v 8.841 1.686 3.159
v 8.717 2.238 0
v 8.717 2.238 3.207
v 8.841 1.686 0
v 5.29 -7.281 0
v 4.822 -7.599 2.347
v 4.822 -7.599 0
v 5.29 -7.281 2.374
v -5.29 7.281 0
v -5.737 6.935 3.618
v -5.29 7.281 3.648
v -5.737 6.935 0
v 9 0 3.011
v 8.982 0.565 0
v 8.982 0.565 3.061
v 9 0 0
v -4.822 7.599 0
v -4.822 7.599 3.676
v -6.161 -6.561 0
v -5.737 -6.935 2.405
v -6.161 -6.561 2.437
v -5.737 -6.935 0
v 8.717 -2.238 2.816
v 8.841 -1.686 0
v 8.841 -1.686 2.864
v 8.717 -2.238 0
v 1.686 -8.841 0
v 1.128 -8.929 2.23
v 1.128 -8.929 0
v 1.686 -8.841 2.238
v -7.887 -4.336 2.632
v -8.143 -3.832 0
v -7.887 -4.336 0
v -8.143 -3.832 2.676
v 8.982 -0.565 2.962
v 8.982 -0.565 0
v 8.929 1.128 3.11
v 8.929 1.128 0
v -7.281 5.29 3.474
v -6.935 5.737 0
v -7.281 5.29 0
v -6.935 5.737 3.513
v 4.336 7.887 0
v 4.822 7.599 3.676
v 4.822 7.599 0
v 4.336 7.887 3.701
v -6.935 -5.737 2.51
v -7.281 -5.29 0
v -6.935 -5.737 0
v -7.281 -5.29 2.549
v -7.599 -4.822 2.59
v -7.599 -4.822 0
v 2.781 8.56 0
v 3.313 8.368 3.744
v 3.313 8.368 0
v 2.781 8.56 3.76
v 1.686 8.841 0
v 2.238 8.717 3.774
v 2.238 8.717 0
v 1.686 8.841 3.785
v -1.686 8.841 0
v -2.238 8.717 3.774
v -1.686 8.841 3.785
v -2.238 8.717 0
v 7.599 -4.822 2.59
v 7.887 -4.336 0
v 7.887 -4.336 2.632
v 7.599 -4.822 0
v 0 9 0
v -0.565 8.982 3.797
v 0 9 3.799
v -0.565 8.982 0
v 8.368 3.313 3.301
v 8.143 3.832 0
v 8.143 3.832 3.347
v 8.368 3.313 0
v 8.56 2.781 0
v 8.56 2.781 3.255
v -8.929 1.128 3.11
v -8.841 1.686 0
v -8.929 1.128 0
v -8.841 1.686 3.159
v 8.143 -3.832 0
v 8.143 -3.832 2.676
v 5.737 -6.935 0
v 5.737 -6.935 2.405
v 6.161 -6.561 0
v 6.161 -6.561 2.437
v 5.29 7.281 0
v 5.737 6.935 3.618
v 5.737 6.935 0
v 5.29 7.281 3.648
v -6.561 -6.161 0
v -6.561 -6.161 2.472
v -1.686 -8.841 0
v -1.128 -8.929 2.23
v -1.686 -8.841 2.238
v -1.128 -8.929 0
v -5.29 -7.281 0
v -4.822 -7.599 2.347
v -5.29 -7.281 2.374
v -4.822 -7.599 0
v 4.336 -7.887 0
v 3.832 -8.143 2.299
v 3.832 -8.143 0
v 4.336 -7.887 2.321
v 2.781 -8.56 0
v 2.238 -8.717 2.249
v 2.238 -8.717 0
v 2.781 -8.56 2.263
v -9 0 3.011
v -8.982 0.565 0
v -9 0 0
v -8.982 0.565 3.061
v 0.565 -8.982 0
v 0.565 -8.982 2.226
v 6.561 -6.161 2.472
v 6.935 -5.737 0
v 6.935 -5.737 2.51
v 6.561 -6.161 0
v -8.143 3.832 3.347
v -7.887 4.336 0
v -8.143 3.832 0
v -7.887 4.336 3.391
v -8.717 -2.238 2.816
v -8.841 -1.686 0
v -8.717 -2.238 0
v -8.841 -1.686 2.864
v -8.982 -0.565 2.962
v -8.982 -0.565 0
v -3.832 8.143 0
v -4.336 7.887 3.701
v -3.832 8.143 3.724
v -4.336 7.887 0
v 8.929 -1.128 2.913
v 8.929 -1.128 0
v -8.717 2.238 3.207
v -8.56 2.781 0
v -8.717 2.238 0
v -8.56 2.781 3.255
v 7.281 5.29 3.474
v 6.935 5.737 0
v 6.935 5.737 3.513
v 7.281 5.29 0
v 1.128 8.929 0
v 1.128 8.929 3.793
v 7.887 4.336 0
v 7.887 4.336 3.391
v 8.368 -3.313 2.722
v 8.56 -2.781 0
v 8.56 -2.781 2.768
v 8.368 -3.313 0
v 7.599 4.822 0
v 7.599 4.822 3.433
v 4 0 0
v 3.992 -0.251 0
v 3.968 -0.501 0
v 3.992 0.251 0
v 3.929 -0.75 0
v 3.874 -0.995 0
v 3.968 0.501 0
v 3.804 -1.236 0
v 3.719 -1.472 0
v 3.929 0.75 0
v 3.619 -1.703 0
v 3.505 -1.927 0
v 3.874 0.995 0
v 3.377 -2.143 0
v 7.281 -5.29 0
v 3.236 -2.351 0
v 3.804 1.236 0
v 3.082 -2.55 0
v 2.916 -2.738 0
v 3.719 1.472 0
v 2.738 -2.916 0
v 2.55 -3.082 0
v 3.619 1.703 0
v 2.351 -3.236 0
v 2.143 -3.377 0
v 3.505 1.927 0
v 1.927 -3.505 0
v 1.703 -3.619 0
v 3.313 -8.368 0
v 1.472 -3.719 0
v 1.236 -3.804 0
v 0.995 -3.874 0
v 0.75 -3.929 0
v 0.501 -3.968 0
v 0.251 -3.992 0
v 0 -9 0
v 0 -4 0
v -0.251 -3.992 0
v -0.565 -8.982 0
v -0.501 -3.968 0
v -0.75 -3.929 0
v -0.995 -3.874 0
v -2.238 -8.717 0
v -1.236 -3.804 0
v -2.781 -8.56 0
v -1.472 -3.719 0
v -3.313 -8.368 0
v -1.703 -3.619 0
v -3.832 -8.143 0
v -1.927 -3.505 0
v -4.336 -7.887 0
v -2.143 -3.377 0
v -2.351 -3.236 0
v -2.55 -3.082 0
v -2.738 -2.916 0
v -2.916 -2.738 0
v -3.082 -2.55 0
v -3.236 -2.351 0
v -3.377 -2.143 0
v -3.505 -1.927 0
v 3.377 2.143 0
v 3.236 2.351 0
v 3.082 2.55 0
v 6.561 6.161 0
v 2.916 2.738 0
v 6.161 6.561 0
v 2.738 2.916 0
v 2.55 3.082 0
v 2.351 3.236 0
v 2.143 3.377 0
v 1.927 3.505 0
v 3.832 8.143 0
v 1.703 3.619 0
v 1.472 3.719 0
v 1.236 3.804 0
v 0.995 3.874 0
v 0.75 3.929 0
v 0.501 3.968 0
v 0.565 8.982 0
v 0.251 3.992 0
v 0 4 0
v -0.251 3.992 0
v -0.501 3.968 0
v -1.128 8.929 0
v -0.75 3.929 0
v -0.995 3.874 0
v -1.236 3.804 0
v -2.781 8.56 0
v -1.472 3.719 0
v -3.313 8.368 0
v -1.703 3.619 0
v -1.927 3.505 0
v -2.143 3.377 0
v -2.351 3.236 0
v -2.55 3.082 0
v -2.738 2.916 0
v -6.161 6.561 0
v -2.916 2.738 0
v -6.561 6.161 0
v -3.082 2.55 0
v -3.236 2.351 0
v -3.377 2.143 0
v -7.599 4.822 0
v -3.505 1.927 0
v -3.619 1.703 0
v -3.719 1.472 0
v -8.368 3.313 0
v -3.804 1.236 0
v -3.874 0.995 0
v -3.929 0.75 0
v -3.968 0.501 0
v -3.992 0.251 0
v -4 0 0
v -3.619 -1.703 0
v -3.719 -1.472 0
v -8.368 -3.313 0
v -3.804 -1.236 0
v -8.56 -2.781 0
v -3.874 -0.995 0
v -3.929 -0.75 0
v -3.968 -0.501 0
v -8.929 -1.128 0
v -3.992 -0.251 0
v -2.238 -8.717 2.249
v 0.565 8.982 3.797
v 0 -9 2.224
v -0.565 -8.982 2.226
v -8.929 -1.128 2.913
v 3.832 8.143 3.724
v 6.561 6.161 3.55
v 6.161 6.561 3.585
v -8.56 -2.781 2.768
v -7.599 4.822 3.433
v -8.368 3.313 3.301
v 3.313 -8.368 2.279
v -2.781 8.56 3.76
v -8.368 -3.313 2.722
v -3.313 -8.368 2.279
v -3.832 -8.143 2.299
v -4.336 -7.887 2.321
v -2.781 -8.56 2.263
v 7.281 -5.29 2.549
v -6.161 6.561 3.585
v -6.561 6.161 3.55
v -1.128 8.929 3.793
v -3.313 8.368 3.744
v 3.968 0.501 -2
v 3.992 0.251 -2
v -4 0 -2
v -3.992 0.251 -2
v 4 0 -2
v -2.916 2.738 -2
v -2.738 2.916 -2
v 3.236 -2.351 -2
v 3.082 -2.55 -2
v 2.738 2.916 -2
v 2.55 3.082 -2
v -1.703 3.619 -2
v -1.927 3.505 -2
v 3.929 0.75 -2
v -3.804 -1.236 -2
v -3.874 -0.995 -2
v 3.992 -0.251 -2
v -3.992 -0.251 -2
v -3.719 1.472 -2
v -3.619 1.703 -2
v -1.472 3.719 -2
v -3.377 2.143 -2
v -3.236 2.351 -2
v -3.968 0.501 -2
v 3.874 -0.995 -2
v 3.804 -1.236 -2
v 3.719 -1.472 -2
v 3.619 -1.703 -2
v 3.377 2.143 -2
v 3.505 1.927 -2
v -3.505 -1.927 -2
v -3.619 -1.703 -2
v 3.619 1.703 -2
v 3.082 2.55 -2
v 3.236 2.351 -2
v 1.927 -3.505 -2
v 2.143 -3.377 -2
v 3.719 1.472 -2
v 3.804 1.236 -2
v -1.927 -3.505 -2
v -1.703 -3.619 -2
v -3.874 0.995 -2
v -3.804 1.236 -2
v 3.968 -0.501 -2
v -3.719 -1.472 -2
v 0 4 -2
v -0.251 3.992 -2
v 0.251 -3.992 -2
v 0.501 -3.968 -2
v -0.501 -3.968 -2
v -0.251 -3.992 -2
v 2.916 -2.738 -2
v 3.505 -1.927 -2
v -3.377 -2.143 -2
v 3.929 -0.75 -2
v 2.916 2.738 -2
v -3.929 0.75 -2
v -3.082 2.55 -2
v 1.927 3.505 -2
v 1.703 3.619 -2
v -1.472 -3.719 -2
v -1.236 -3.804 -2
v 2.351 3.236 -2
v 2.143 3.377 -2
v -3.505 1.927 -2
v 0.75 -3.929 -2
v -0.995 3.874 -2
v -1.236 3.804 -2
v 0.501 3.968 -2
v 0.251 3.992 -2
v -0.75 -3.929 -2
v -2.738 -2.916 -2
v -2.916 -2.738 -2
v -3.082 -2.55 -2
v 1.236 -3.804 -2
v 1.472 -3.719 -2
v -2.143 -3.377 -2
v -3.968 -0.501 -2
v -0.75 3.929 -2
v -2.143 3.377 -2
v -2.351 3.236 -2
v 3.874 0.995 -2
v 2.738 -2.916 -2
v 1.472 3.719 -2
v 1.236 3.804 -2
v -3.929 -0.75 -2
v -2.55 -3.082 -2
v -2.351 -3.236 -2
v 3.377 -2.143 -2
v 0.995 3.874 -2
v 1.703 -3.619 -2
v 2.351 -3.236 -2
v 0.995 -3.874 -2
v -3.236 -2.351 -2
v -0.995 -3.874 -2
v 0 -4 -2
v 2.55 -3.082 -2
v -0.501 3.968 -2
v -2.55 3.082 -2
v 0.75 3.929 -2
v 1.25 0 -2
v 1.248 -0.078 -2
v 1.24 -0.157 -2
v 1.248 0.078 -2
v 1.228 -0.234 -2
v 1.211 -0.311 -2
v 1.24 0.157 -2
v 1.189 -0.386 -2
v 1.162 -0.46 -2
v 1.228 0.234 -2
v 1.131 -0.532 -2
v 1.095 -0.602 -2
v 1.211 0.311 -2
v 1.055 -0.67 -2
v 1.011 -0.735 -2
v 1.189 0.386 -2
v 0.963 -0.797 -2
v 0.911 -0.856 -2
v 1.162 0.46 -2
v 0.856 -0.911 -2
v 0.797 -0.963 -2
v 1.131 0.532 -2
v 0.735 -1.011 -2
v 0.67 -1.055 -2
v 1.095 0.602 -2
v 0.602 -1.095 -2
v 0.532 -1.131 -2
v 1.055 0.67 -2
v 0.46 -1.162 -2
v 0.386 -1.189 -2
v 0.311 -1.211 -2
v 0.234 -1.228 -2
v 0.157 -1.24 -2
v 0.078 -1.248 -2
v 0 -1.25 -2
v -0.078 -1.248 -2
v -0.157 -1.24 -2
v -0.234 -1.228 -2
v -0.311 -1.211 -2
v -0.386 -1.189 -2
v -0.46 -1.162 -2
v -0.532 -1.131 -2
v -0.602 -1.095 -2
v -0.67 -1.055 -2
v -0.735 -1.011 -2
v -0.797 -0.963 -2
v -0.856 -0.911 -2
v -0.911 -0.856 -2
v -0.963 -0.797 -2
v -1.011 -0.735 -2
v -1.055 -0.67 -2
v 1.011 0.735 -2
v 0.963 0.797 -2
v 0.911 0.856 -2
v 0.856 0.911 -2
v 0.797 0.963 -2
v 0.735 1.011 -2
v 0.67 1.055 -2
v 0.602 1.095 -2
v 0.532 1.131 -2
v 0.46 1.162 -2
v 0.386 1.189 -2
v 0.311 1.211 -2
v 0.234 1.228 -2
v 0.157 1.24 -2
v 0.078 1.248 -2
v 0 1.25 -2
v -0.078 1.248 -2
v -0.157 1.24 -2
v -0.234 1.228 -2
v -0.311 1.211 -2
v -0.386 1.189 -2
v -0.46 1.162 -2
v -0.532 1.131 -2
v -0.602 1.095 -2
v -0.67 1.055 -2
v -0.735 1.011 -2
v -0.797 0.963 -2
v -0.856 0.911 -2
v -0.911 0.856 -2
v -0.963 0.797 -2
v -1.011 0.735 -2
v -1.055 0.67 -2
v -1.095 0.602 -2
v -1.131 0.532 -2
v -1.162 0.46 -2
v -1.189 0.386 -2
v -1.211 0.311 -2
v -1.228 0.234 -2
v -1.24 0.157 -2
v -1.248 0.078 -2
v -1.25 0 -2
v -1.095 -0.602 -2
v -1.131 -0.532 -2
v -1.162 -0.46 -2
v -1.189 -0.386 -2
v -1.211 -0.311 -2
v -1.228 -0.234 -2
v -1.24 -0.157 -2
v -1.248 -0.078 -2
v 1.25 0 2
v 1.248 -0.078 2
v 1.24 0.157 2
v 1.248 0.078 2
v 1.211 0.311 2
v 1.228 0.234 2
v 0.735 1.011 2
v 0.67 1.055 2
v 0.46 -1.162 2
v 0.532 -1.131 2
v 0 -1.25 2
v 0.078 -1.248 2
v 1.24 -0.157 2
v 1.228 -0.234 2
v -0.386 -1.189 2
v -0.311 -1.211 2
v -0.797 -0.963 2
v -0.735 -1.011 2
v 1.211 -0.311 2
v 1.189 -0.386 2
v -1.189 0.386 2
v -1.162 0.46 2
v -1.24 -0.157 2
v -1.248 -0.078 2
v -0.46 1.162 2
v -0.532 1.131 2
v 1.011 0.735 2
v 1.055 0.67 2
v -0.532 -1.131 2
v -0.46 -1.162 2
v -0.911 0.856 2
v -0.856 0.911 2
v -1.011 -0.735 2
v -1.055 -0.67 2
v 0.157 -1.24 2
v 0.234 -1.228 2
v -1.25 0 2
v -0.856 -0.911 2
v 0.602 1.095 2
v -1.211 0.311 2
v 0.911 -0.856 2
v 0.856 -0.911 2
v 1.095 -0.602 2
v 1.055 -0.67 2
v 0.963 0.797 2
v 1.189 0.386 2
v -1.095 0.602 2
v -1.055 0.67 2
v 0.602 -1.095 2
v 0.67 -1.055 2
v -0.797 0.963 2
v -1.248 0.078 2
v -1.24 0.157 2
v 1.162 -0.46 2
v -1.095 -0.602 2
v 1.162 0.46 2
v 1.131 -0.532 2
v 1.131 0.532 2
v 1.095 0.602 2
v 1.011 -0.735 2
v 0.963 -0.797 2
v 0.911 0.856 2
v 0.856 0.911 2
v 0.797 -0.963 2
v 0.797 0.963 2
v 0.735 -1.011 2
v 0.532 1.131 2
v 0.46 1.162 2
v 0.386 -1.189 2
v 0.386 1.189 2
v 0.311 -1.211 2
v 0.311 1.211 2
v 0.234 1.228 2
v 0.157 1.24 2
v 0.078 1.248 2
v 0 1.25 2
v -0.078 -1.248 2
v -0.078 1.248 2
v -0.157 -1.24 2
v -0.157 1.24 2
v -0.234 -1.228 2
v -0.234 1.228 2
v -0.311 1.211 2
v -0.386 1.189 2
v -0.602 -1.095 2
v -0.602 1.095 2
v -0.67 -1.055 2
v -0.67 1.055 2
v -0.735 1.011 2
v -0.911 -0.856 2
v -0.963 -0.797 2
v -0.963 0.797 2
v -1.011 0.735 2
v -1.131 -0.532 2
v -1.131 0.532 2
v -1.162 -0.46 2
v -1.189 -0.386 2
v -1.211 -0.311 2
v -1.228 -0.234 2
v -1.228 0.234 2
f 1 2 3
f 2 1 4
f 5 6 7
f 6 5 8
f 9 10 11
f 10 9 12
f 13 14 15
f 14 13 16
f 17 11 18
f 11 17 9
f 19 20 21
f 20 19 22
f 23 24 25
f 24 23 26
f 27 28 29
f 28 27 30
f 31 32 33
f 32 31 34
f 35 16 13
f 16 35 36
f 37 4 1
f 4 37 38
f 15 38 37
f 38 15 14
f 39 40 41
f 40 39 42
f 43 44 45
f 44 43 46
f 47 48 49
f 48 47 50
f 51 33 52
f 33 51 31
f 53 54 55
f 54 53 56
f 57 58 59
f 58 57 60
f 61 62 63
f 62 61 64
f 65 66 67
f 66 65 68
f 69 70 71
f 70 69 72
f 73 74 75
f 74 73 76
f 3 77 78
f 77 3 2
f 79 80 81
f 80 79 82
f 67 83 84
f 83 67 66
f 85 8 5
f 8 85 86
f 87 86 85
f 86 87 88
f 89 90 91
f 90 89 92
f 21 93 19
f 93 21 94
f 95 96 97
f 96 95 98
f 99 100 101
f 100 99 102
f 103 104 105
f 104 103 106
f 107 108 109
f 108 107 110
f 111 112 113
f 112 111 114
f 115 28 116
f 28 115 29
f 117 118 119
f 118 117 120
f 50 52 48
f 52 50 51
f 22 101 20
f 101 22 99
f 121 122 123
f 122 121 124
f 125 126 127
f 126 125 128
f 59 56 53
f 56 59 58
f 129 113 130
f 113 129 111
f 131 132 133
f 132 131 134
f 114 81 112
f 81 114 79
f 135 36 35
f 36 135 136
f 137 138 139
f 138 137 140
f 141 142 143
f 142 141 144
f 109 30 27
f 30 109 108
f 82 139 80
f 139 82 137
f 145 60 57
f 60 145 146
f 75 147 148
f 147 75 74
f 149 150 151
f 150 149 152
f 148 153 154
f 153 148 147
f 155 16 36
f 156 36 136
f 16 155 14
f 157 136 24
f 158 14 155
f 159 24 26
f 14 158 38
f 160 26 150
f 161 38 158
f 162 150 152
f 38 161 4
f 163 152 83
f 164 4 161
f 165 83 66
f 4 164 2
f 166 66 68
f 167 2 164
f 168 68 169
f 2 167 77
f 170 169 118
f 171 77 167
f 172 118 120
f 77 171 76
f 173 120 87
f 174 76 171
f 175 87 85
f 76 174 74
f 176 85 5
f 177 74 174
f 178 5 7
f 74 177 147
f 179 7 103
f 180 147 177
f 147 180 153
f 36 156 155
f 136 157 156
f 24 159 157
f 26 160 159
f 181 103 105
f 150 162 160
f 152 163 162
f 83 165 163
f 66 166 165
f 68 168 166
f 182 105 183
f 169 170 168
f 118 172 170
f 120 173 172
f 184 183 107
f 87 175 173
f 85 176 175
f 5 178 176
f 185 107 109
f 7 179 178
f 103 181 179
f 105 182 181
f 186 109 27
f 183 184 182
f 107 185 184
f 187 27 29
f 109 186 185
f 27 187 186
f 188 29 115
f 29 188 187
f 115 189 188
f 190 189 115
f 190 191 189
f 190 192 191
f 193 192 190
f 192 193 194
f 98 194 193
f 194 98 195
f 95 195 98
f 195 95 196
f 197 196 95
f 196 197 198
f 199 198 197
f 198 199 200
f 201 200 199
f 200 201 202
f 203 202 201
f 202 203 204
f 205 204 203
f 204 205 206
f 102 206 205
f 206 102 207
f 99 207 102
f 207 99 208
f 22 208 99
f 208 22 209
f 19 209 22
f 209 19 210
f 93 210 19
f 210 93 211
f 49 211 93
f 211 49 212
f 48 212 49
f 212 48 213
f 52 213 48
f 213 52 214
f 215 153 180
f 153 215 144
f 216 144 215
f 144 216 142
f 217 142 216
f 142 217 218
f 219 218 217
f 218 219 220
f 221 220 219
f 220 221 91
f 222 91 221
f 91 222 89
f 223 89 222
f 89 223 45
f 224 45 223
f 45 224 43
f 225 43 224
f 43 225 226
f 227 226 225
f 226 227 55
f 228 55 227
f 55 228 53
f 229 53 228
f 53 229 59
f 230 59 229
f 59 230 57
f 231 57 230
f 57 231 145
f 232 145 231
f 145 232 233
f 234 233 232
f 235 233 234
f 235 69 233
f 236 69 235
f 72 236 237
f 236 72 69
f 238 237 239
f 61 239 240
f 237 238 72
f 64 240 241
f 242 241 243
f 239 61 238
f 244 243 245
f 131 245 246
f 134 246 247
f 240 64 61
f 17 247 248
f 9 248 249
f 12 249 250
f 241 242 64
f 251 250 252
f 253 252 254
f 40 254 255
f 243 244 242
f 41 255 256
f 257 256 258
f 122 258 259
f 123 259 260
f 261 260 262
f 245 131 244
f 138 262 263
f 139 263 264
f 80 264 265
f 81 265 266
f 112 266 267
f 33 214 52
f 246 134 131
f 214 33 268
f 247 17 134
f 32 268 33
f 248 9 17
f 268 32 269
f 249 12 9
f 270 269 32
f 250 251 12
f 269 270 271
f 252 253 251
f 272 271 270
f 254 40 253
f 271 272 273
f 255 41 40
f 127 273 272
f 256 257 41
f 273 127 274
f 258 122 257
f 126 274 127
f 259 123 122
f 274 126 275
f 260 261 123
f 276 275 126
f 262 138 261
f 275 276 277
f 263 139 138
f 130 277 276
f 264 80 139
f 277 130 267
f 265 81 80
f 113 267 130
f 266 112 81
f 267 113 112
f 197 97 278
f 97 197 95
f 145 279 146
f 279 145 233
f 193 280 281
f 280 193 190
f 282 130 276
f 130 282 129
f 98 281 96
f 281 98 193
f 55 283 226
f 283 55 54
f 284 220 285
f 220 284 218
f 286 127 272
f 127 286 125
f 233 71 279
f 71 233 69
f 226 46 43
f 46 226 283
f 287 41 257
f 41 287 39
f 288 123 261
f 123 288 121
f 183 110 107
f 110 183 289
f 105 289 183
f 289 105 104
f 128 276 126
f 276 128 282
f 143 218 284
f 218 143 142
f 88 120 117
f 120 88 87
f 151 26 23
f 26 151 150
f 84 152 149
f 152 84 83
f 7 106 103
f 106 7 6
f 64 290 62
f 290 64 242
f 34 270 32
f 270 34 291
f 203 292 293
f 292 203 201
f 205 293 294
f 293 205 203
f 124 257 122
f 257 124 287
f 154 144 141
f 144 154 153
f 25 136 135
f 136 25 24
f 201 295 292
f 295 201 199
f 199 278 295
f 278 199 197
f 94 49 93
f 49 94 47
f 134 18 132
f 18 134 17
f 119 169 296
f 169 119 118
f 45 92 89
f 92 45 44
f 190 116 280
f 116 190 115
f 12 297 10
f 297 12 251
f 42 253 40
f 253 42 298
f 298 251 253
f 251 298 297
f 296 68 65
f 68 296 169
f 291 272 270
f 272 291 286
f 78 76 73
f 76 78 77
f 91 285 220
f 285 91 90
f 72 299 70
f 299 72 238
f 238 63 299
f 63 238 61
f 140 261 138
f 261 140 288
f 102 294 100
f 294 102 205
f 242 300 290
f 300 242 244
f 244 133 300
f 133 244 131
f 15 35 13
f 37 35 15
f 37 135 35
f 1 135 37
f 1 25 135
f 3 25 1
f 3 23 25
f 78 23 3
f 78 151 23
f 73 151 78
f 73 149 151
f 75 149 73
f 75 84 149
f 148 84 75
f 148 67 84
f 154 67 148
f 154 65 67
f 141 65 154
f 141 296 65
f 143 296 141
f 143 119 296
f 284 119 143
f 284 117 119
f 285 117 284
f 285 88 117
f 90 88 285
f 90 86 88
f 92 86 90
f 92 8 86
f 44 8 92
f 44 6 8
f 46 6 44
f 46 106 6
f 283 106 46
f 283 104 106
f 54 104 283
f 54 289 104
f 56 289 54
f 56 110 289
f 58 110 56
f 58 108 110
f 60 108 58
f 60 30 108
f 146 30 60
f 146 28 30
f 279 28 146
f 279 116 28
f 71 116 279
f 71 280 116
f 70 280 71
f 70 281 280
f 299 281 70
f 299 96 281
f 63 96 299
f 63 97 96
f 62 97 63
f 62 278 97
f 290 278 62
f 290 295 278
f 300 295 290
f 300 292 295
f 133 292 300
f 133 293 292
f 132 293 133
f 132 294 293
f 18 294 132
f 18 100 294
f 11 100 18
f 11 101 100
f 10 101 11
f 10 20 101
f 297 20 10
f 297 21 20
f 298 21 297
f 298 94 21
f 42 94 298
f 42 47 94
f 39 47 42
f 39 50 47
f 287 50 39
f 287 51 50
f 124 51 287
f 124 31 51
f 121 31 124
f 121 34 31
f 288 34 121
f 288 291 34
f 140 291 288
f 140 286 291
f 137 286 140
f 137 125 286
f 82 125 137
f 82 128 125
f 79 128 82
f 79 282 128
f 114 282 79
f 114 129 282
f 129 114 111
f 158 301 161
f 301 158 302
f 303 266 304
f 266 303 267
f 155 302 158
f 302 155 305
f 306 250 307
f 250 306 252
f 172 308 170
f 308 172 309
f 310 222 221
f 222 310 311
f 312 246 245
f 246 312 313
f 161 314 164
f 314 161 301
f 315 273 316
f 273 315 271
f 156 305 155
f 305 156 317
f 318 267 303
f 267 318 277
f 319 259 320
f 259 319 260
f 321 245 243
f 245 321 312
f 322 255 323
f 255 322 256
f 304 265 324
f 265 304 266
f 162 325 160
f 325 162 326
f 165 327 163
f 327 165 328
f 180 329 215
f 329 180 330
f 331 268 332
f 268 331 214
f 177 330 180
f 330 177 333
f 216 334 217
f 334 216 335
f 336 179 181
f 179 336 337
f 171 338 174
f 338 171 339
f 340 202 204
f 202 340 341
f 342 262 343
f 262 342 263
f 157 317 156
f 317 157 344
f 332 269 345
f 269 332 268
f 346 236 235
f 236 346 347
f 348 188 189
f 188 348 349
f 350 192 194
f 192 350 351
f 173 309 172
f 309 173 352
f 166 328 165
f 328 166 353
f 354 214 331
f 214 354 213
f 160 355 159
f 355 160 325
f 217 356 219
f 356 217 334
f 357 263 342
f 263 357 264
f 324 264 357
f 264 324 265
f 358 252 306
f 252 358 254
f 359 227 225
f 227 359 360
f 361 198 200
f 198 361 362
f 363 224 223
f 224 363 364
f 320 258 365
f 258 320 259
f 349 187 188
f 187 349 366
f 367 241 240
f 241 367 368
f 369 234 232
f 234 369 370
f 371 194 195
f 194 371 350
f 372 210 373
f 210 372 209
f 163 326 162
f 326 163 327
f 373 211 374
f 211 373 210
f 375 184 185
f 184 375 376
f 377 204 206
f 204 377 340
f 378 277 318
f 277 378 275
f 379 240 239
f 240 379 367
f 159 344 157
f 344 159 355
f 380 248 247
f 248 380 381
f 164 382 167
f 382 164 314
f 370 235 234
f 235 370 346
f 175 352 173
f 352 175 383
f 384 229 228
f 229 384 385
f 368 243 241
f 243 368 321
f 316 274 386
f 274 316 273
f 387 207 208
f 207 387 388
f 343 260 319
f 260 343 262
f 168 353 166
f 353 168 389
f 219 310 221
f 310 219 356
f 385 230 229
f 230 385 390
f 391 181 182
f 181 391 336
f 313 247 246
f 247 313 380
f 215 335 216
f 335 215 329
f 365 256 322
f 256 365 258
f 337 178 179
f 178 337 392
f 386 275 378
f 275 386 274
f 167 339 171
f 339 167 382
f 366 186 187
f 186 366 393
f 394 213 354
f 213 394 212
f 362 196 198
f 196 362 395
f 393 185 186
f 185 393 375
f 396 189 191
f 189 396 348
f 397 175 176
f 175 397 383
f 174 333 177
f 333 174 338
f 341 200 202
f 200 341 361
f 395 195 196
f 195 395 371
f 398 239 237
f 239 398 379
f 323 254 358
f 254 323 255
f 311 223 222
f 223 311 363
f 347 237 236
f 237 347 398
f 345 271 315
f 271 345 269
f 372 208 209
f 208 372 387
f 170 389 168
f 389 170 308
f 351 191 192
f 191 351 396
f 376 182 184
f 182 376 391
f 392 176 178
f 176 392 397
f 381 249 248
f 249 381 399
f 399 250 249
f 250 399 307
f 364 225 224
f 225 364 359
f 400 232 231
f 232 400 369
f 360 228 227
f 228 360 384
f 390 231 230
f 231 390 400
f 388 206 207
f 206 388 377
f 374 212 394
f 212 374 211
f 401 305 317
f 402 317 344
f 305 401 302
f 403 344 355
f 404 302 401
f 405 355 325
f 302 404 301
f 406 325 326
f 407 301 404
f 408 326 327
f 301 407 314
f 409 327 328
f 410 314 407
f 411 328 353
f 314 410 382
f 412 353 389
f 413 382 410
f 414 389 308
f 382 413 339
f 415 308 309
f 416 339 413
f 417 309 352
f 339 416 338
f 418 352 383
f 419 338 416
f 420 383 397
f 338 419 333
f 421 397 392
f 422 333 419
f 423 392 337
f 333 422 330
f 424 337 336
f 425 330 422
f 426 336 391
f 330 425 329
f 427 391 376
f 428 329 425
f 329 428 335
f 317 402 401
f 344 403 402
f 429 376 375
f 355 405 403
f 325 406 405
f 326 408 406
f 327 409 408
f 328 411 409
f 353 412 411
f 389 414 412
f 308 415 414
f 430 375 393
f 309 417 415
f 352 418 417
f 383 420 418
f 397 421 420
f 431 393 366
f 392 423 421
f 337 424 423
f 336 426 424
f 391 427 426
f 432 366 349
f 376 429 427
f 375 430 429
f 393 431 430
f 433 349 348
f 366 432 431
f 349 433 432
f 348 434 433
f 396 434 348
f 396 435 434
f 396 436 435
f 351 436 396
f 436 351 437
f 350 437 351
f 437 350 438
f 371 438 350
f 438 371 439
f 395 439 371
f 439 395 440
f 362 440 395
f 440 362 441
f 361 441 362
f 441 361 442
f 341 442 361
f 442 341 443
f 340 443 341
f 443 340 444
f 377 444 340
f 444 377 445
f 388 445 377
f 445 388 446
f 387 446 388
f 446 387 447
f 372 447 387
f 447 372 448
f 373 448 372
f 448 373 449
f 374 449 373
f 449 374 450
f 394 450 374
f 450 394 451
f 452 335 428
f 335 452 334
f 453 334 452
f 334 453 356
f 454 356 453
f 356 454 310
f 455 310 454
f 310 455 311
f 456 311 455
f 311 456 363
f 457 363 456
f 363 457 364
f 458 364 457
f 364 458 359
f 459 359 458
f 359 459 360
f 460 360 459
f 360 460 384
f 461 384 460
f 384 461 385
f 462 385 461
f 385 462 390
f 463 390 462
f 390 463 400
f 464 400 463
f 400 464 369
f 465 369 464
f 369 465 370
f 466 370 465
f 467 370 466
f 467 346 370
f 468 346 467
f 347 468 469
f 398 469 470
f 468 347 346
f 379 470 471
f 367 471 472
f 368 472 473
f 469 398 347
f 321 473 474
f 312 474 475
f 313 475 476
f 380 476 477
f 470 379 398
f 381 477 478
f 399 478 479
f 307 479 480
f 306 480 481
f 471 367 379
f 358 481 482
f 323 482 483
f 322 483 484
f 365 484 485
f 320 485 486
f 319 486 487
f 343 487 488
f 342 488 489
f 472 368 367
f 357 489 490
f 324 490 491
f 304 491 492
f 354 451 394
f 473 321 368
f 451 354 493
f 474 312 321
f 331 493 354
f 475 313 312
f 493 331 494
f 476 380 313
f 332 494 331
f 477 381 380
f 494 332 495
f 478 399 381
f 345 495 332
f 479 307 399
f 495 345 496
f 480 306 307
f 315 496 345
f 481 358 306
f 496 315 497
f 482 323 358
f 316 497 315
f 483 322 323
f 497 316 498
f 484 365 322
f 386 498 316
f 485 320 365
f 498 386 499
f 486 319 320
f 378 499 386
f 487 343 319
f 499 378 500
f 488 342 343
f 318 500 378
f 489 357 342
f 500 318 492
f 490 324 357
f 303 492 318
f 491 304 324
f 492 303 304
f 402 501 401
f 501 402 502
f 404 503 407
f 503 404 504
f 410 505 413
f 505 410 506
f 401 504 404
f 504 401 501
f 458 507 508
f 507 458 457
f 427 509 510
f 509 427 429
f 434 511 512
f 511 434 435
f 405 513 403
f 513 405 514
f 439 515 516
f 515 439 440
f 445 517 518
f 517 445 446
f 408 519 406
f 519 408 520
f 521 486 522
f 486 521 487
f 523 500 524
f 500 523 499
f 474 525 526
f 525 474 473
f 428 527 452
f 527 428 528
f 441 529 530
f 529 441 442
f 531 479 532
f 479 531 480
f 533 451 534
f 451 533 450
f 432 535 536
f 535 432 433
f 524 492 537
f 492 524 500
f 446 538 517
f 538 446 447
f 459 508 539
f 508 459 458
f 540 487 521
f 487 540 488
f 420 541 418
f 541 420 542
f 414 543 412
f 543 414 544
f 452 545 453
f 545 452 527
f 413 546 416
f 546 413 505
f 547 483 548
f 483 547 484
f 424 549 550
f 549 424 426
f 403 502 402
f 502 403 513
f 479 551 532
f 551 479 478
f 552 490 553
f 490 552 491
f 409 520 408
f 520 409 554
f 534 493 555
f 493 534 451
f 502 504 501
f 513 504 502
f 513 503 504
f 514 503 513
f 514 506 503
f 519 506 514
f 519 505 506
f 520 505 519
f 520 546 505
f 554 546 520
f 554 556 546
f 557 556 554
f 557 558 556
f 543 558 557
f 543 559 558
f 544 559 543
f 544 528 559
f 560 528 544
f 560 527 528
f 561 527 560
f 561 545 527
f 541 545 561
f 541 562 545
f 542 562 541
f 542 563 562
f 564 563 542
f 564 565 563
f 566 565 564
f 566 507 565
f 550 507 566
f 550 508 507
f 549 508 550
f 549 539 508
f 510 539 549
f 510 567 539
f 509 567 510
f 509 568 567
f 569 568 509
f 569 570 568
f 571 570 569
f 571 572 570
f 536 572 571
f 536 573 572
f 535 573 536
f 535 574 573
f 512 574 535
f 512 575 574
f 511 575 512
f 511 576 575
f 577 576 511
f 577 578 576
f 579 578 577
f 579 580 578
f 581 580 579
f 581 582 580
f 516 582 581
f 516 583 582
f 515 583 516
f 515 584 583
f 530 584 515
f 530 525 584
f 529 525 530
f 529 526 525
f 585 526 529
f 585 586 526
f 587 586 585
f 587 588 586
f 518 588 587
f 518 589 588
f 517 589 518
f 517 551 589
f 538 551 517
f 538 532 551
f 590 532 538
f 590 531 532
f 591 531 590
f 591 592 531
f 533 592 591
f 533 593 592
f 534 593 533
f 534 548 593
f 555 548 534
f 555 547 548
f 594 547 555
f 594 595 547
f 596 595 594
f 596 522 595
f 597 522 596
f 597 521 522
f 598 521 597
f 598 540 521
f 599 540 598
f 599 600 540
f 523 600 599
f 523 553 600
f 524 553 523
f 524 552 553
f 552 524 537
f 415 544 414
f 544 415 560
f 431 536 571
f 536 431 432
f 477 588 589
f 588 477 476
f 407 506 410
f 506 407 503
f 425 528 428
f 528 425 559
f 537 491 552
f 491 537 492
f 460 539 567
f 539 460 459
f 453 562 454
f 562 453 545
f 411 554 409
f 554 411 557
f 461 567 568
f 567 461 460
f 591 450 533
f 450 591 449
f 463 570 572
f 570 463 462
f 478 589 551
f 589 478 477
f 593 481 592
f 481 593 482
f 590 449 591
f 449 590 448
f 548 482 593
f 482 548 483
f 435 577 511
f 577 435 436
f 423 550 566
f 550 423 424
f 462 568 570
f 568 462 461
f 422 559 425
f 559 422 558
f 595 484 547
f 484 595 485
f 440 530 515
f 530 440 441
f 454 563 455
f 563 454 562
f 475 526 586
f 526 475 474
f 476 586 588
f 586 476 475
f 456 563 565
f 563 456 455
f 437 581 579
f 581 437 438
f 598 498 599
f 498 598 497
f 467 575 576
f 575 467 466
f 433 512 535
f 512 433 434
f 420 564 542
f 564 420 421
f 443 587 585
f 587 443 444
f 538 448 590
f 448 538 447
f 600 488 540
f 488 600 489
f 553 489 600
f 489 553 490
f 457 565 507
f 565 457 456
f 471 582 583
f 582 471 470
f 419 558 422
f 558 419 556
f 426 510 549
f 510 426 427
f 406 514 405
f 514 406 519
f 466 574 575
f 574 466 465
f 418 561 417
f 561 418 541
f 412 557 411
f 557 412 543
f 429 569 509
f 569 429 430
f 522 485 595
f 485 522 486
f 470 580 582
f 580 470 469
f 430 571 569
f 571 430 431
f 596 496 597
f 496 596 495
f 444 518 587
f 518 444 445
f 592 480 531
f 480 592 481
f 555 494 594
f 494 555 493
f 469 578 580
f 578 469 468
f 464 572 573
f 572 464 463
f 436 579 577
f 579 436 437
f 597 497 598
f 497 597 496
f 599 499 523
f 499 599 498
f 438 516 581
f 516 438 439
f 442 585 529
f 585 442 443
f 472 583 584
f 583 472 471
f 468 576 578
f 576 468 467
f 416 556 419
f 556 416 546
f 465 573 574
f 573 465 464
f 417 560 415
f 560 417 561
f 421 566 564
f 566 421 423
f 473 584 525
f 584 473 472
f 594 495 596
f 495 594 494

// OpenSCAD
/*

    motor_flange2.scad

    
    Flange for motor used in laser audio project. The top of the cylinder is tilted and that's the surface to stick the mirror onto.
    
    
    Author: Mahesh Venkitachalam (electronut.in)
*/

// set smoothness
$fn=100;

// tilt angle 
a = 5;

// top cylinder module 
module top_cyl(a = 5, r = 9, h = 20, t = 3) {
// mirror support
difference() {
    // top cylinder 
    linear_extrude(h) {
        circle(r);
    }

    // cutting solid 
    rotate(a, [1, 0, 0]) {
        translate([-h, -h, t]) {
            linear_extrude(h) {
                square(2*h);
            }
        }
    }
}
}

// bottom cylinder with hole 
module bot_cyl(r = 4, h = 4) {
difference() {
    // shaft support
    translate([0, 0, -2]) {
        linear_extrude(h) {
            circle(r);
        }
    }   
}
}

module hole(r = 1.25) {
    // shaft hole
    translate([0, 0, -8]) {
        #linear_extrude(10) {
            circle(r);  
        }
    }   
}

difference() {
union() {
    #top_cyl(a = 5, r = 9, h = 20, t = 3);
    bot_cyl();
}

hole();

}
